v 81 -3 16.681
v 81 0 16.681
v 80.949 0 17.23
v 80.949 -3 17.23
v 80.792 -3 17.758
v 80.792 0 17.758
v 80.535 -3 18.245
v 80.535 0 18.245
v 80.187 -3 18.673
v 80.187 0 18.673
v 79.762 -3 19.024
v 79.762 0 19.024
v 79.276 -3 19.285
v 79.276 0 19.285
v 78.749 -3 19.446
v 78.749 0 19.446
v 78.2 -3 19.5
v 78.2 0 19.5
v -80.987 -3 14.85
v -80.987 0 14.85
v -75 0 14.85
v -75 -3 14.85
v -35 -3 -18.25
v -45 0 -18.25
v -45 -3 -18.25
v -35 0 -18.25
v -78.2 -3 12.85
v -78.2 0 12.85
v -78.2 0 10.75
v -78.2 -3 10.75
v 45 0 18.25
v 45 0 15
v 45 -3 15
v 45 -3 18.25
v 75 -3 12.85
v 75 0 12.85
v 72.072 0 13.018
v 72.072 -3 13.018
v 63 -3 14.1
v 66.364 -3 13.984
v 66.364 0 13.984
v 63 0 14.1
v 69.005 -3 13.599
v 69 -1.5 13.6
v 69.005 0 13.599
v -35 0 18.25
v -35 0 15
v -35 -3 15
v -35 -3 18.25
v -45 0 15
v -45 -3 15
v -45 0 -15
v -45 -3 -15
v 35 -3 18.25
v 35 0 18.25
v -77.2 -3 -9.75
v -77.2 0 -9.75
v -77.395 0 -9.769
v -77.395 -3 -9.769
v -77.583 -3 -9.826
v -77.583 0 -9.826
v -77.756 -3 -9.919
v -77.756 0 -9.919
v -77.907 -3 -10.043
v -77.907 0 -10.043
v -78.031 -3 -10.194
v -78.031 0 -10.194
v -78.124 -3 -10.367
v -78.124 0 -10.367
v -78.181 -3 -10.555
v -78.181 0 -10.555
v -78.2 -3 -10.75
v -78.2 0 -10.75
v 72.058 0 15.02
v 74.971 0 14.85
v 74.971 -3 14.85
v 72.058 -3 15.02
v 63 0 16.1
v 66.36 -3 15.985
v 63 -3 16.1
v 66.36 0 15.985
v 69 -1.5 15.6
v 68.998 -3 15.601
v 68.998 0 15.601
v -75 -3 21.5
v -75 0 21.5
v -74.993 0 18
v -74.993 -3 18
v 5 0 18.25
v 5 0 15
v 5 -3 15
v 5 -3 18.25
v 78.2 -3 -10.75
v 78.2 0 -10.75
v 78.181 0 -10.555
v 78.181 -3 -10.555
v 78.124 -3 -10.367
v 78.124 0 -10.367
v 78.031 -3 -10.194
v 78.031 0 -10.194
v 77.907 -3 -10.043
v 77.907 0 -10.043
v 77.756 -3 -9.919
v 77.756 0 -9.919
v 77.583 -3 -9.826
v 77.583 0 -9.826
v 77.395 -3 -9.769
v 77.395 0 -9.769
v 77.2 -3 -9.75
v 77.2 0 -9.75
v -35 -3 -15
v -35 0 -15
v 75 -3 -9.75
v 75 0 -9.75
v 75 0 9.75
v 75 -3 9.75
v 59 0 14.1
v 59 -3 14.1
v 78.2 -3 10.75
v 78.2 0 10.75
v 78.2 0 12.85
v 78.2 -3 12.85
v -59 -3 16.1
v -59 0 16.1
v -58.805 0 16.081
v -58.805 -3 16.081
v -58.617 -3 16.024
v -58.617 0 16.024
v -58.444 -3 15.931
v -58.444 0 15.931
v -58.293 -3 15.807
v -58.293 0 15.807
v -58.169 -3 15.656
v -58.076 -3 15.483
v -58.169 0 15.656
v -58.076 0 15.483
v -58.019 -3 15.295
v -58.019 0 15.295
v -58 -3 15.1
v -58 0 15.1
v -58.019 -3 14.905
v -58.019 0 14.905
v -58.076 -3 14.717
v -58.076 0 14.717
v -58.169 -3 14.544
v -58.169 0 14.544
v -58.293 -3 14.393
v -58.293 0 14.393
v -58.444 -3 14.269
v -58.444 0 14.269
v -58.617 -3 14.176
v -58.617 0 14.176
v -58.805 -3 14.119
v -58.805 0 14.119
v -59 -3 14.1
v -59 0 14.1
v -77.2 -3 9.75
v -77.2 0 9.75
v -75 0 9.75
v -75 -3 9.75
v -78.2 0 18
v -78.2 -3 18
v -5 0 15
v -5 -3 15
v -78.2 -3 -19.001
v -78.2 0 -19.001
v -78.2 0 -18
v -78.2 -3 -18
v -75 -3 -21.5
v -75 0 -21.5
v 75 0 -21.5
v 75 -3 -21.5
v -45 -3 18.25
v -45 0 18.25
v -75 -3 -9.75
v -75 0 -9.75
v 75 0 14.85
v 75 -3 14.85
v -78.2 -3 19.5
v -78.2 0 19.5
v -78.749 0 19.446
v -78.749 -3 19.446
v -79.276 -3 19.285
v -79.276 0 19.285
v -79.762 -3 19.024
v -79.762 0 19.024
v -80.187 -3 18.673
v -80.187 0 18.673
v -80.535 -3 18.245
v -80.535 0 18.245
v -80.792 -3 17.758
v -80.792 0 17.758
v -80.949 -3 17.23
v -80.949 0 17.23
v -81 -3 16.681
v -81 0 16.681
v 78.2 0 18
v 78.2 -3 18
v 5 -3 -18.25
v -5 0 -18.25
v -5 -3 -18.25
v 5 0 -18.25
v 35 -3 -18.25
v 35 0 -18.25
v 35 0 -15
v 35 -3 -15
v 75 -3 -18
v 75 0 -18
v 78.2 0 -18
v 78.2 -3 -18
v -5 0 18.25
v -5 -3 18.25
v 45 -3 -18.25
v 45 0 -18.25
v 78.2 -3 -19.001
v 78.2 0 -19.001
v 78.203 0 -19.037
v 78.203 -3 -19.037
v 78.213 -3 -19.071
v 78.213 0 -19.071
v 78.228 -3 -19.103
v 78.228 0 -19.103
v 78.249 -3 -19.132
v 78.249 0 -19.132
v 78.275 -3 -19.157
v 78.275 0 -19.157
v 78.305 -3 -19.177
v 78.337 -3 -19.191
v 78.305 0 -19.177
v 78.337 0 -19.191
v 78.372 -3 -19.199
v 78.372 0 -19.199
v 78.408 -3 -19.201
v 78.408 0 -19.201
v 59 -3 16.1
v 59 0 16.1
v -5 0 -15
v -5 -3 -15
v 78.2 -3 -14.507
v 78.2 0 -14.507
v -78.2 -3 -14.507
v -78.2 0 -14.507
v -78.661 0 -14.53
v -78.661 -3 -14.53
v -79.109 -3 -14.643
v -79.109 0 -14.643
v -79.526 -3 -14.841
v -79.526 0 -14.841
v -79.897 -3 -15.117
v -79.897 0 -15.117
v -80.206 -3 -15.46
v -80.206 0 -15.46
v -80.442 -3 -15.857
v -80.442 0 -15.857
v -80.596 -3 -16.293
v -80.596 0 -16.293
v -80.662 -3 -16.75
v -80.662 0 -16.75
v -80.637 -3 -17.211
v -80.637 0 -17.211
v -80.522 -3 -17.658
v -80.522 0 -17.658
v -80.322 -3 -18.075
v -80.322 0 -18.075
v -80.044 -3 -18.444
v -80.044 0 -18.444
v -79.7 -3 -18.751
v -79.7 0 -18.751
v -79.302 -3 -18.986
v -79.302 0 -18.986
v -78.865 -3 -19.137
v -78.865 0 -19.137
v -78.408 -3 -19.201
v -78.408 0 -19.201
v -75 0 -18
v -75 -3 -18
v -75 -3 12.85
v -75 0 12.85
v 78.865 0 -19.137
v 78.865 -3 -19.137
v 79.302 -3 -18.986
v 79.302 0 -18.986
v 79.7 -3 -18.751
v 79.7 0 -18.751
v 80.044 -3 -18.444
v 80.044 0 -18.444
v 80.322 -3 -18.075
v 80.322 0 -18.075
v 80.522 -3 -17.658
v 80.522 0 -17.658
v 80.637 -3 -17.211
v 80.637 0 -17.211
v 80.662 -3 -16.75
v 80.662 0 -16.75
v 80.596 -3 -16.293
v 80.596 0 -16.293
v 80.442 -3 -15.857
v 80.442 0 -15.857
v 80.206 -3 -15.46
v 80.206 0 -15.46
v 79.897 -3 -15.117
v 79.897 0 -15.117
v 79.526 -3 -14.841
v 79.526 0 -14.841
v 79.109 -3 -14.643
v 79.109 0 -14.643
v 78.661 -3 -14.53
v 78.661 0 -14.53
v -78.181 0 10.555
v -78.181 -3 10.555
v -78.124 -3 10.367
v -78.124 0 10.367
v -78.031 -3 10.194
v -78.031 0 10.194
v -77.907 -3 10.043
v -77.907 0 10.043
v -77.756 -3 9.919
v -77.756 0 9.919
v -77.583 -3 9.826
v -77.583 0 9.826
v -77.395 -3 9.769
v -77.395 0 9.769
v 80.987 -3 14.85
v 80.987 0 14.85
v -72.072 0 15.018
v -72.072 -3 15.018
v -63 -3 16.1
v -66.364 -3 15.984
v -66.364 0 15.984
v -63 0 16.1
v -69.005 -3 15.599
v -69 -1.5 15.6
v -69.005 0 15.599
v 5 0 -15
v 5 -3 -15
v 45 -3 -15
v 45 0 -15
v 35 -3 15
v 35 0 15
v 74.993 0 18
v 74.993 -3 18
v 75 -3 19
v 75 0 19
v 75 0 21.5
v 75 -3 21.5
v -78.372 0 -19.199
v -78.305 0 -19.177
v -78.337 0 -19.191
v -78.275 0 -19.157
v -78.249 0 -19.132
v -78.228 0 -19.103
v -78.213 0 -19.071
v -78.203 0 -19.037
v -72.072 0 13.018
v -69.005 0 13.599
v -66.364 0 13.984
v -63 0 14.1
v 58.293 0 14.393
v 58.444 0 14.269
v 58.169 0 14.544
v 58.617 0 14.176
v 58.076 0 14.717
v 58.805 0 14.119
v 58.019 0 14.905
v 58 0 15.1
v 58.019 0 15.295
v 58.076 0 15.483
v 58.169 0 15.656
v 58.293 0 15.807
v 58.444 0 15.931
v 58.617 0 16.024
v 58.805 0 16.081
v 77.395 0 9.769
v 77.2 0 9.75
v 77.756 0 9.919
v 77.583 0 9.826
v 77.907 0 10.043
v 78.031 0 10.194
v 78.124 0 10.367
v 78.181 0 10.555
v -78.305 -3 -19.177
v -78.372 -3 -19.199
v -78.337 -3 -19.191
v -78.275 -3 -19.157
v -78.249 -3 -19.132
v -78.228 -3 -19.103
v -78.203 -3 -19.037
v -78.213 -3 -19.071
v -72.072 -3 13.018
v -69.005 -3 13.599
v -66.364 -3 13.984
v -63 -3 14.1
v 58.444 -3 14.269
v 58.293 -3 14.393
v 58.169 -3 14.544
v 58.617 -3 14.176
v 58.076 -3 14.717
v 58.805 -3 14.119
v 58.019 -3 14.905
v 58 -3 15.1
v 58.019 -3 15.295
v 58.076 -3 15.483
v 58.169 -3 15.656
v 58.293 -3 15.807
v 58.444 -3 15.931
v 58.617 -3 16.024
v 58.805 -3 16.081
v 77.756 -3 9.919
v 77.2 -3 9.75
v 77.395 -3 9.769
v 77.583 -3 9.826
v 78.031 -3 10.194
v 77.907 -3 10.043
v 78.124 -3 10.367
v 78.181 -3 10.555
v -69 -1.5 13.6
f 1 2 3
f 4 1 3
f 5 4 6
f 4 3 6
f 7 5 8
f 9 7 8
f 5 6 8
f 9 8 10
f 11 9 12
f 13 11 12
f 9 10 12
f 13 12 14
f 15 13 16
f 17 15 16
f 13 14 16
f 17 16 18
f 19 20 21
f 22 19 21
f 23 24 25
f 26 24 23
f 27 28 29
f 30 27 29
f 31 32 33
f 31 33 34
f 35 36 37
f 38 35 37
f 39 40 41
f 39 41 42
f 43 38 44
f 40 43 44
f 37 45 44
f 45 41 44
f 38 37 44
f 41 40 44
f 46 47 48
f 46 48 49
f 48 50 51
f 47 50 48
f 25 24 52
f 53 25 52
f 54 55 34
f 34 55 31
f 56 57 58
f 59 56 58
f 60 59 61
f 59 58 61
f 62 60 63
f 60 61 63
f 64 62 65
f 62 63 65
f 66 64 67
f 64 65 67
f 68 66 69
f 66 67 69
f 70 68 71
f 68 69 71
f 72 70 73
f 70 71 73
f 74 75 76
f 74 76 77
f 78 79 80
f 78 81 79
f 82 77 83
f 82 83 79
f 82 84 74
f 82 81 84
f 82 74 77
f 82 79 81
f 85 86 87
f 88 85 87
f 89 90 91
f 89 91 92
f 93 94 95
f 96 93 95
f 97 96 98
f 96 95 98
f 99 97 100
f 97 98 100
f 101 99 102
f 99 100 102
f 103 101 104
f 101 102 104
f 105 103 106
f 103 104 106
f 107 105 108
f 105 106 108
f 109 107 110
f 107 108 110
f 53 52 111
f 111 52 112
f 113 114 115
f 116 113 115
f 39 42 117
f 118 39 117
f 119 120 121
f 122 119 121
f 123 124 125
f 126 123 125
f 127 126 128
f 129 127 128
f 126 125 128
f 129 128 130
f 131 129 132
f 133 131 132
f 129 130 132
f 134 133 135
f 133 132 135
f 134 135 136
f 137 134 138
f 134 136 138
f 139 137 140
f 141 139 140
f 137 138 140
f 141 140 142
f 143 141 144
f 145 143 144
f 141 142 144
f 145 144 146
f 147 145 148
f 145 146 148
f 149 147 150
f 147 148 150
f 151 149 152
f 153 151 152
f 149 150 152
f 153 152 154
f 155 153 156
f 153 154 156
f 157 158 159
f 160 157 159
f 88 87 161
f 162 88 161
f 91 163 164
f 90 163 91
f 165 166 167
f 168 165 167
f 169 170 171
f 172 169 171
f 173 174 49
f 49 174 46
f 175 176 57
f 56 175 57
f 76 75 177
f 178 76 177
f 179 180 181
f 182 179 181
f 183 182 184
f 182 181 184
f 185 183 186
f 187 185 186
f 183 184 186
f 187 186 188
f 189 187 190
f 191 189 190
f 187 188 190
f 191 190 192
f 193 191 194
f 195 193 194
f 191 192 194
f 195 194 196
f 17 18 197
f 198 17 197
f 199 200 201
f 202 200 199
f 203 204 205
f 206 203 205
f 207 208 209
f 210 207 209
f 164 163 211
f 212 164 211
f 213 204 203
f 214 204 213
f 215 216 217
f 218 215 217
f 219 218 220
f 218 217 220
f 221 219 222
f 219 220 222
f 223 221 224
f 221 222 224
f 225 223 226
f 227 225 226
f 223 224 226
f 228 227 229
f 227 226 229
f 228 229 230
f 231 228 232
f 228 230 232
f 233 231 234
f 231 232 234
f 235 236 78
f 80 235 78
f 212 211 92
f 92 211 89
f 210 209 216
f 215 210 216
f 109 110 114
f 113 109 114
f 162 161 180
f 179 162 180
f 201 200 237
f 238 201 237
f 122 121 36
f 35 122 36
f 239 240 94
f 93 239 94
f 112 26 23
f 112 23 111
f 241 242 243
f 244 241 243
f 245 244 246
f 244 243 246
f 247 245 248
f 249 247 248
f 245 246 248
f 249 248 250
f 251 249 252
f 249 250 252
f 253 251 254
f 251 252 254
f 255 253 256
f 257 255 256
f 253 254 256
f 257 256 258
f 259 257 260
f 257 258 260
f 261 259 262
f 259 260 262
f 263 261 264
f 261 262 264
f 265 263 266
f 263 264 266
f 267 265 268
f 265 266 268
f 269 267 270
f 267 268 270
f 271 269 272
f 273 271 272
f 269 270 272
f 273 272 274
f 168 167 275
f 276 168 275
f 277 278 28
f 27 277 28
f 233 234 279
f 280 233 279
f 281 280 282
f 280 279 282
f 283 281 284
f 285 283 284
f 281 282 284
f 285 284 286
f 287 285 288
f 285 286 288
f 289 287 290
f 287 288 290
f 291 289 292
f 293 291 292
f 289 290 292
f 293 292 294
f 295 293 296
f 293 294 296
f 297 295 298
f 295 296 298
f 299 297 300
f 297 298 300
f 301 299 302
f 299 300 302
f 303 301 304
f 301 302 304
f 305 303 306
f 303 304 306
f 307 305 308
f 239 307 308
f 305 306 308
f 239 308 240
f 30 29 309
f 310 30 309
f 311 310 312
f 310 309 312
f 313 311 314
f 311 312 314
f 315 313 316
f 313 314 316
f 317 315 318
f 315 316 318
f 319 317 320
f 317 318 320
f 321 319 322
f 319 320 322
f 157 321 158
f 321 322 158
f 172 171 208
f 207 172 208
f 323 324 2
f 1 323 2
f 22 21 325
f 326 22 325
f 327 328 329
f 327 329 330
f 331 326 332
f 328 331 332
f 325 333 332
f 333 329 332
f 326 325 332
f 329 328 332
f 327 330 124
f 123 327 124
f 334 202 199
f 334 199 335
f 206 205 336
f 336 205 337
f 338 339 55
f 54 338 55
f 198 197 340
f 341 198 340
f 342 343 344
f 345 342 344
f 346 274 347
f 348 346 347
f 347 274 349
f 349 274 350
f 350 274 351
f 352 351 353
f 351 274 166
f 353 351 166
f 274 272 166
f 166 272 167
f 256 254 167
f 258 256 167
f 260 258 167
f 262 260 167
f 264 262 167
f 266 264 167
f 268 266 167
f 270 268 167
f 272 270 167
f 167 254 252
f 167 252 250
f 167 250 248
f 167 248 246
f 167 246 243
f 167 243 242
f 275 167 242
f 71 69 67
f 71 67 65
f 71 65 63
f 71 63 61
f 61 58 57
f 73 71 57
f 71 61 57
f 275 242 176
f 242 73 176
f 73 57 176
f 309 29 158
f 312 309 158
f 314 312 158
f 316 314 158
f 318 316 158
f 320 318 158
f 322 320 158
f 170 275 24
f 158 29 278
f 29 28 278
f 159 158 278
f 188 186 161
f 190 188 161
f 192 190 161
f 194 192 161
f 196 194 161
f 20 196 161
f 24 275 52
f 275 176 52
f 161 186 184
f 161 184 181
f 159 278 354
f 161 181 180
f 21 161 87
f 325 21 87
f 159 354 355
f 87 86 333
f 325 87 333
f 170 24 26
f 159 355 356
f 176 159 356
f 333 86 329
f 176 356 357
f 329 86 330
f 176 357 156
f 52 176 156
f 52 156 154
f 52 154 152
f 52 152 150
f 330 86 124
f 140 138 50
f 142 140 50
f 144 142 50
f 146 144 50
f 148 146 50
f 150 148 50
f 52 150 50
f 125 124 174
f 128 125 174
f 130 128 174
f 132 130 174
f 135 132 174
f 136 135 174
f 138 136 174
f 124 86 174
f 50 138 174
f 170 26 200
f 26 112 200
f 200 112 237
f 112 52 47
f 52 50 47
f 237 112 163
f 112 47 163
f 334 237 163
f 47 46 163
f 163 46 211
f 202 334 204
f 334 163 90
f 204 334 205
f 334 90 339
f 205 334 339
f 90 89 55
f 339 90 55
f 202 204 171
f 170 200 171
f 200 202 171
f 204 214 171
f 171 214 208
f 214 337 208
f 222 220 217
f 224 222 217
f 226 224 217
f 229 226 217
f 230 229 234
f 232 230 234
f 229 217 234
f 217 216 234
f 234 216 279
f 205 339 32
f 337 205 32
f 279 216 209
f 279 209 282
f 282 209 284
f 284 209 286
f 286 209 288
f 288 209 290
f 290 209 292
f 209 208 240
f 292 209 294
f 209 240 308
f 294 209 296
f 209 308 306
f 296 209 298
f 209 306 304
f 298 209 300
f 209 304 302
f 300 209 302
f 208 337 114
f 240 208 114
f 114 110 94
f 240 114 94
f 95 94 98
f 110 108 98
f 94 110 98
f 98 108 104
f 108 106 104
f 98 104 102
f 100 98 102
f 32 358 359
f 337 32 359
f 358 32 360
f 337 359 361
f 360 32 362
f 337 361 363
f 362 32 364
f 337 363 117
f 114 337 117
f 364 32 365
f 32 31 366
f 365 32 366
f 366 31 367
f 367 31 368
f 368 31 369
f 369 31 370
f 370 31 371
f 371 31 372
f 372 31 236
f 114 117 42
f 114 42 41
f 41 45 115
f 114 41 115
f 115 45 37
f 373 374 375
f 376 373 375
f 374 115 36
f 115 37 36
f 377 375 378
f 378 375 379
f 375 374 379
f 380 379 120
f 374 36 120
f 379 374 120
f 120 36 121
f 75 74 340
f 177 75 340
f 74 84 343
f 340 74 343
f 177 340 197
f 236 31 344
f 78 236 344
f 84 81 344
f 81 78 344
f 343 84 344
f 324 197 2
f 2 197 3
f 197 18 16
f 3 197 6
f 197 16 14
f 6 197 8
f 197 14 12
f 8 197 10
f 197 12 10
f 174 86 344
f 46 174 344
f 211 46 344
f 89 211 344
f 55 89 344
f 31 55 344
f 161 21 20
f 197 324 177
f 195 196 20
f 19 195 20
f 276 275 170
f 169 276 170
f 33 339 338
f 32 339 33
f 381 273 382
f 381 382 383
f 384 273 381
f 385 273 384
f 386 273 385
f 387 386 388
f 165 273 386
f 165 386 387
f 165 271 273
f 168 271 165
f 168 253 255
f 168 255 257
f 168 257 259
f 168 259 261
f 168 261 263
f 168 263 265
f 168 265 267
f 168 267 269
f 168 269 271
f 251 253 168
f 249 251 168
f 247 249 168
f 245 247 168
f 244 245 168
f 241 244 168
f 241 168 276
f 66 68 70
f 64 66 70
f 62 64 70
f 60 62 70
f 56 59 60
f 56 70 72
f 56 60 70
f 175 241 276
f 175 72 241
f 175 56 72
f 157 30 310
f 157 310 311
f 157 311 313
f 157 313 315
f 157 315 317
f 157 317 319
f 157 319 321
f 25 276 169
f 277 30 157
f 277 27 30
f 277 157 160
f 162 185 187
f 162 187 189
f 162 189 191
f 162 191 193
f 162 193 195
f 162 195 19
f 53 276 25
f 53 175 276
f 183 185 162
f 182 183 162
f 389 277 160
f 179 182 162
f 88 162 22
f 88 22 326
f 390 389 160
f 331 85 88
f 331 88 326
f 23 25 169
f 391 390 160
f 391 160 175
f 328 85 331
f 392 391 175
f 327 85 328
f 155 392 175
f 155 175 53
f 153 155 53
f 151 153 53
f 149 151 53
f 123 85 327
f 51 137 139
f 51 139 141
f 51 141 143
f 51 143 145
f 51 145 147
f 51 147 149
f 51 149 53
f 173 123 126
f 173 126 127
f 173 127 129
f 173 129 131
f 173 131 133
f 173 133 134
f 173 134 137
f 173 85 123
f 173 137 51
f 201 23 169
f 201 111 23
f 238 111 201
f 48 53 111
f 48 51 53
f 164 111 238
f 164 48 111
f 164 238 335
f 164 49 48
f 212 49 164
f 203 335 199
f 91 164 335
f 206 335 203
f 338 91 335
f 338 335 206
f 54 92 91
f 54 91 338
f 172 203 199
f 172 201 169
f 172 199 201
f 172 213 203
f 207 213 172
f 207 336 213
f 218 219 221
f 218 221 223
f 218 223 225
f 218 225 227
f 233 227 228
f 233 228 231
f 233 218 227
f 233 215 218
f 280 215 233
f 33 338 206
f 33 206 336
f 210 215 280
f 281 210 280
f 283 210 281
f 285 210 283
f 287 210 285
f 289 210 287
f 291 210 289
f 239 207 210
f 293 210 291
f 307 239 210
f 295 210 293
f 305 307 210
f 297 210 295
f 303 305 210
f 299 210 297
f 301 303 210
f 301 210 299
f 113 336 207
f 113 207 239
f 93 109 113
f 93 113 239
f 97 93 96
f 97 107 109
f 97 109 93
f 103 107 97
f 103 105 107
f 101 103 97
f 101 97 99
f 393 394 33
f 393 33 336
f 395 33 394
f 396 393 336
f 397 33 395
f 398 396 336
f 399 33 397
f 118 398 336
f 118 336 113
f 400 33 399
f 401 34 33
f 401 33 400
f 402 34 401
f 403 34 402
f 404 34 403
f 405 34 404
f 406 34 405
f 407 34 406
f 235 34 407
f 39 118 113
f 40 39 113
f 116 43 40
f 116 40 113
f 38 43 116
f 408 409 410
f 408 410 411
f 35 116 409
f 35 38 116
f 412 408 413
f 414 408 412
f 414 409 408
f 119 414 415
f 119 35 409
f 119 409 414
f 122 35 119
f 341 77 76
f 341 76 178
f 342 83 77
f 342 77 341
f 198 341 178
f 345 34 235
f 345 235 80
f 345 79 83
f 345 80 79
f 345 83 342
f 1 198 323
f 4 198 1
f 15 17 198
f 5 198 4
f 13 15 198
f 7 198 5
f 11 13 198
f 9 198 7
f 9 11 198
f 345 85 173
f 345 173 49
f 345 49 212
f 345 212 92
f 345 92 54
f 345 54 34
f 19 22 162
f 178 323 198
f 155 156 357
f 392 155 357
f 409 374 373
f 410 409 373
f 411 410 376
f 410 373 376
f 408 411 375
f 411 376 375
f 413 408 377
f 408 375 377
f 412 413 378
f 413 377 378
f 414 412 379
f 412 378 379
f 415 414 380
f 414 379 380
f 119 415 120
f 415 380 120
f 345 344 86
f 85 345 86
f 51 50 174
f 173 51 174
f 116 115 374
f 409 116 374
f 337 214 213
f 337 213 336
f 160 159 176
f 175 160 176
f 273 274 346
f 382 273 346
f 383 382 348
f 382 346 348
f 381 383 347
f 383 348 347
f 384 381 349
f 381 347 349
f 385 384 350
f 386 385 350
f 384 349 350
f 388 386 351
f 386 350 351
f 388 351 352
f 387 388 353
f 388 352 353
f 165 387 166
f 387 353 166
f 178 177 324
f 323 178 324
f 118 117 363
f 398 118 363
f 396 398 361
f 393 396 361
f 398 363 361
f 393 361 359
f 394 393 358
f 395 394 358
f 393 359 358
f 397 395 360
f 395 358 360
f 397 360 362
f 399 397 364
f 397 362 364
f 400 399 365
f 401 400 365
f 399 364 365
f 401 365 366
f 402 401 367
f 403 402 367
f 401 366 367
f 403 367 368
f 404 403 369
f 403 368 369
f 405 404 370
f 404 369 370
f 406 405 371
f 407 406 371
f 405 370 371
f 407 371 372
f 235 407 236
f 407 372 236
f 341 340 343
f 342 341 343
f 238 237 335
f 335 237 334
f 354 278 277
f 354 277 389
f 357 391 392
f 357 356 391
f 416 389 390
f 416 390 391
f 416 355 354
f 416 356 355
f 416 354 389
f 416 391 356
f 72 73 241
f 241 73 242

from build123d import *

# Parameters (mm, degrees)
F0_W     = 10
F0_H     = 3.25
F1_DEPTH = 3


# Not quite as in the source:
# - ends of sketch curves that miss each other by under 0.0002 mm in the source are joined


with BuildPart() as f1:
    # F0 (on Front) → F1 (new body)
    with BuildSketch(Plane.XZ):
        with BuildLine():
            Line((75, 21.5), (-75, 21.5))
            Line((-75, 21.5), (-74.9930354723, 18.0000069292))
            Line((-74.9930354723, 18.0000069292), (-78.2, 18.0000069292))
            Line((-78.2, 18.0000069292), (-78.2, 19.5000069292))
            ThreePointArc((-78.2, 19.5000069292), (-80.1867814364, 18.6729994594), (-80.999932095, 16.6805065893))
            Line((-80.999932095, 16.6805065893), (-80.9871833927, 14.85))
            Line((-80.9871833927, 14.85), (-75.0000029802, 14.85))
            add(Edge.make_bspline(
                [(-75.0000029802, 14.85), (-72.0000029802, 14.85), (-69.0064407929, 15.7236590768), (-66.0000029802, 16.1), (-63.0000029802, 16.1)],
                knots=[0, 0, 0, 0, 0.5005364838, 1, 1, 1, 1], degree=3))
            Line((-63.0000029802, 16.1), (-59.0000029802, 16.1))
            ThreePointArc((-59.0000029802, 16.1), (-58.0000029802, 15.1), (-59.0000029802, 14.1))
            Line((-59.0000029802, 14.1), (-63.0000029802, 14.1))
            add(Edge.make_bspline(
                [(-74.9999980132, 12.85), (-71.9999980132, 12.85), (-69.0064358259, 13.7236590768), (-65.9999980132, 14.1), (-63.0000029802, 14.1)],
                knots=[0, 0, 0, 0, 0.5005364838, 1, 1, 1, 1], degree=3))
            Line((-74.9999980132, 12.85), (-78.2, 12.85))
            Line((-78.2, 12.85), (-78.2, 10.75))
            ThreePointArc((-78.2, 10.75), (-77.9071067812, 10.0428932188), (-77.2, 9.75))
            Line((-77.2, 9.75), (-75, 9.75))
            Line((-75, 9.75), (-75, -9.75))
            Line((-75, -9.75), (-75, -18.0000069292))
            Line((-75, -18.0000069292), (-75, -21.5))
            Line((-75, -21.5), (75, -21.5))
            Line((75, -21.5), (75, -18.0000069292))
            Line((75, -18.0000069292), (75, -9.75))
            Line((75, -9.75), (75, 9.75))
            Line((75, 9.75), (77.2, 9.75))
            ThreePointArc((77.2, 9.75), (77.9071067812, 10.0428932188), (78.2, 10.75))
            Line((78.2, 10.75), (78.2, 12.85))
            Line((78.2, 12.85), (74.9999980132, 12.85))
            add(Edge.make_bspline(
                [(74.9999980132, 12.85), (71.9999980132, 12.85), (69.0064358259, 13.7236590768), (65.9999980132, 14.1), (62.9999980132, 14.1)],
                knots=[0, 0, 0, 0, 0.5005364838, 1, 1, 1, 1], degree=3))
            Line((62.9999980132, 14.1), (59.0000029802, 14.1))
            ThreePointArc((59.0000029802, 14.1), (58.0000029802, 15.1), (59.0000029802, 16.1))
            Line((59.0000029802, 16.1), (63.0000029802, 16.1))
            add(Edge.make_bspline(
                [(74.9710970223, 14.8500135578), (71.9903624817, 14.8528122415), (69.001599828, 15.7242650608), (66.0000029802, 16.1), (63.0000029802, 16.1)],
                knots=[0.0016101996, 0.0016101996, 0.0016101996, 0.0016101996, 0.5005364838, 1, 1, 1, 1], degree=3))
            Line((74.9710970223, 14.8500135578), (75.0000029802, 14.85))
            Line((75.0000029802, 14.85), (80.9871833927, 14.85))
            Line((80.9871833927, 14.85), (80.999932095, 16.6805065893))
            ThreePointArc((80.999932095, 16.6805065893), (80.1867814364, 18.6729994594), (78.2, 19.5000069292))
            Line((78.2, 19.5000069292), (78.2, 18.0000069292))
            Line((78.2, 18.0000069292), (74.9930354723, 18.0000069292))
            Line((74.9930354723, 18.0000069292), (75, 19))
            Line((75, 19), (75, 21.5))
        make_face()
        with Locations((-40, -16.625)):
            Rectangle(F0_W, F0_H, mode=Mode.SUBTRACT)
        with Locations((0, -16.625)):
            Rectangle(F0_W, F0_H, mode=Mode.SUBTRACT)
        with Locations((40, -16.625)):
            Rectangle(F0_W, F0_H, mode=Mode.SUBTRACT)
        with Locations((-40, 16.625)):
            Rectangle(F0_W, F0_H, mode=Mode.SUBTRACT)
        with Locations((0, 16.625)):
            Rectangle(F0_W, F0_H, mode=Mode.SUBTRACT)
        with Locations((40, 16.625)):
            Rectangle(F0_W, F0_H, mode=Mode.SUBTRACT)
        with BuildLine():
            Line((-75, -18.0000069292), (-75, -9.75))
            Line((-75, -9.75), (-77.2, -9.75))
            ThreePointArc((-77.2, -9.75), (-77.9071067812, -10.0428932188), (-78.2, -10.75))
            Line((-78.2, -10.75), (-78.2, -12.384363041))
            Line((-78.2, -12.384363041), (-78.2, -14.5073579624))
            ThreePointArc((-78.2, -14.5073579624), (-80.6617701682, -16.7497231552), (-78.4079163074, -19.2009793215))
            ThreePointArc((-78.4079163074, -19.2009793215), (-78.2614057387, -19.1453290857), (-78.2, -19.0011360528))
            Line((-78.2, -19.0011360528), (-78.2, -18.0000069292))
            Line((-78.2, -18.0000069292), (-75, -18.0000069292))
        make_face()
        with BuildLine():
            Line((77.2, -9.75), (75, -9.75))
            Line((75, -9.75), (75, -18.0000069292))
            Line((75, -18.0000069292), (78.2, -18.0000069292))
            Line((78.2, -18.0000069292), (78.2, -19.0011360528))
            ThreePointArc((78.2, -19.0011360528), (78.2614057387, -19.1453290857), (78.4079163074, -19.2009793215))
            ThreePointArc((78.4079163074, -19.2009793215), (80.6617701682, -16.7497231552), (78.2, -14.5073579624))
            Line((78.2, -14.5073579624), (78.2, -12.384363041))
            Line((78.2, -12.384363041), (78.2, -10.75))
            ThreePointArc((78.2, -10.75), (77.9071067812, -10.0428932188), (77.2, -9.75))
        make_face()
    extrude(amount=F1_DEPTH)


solid = f1.part
